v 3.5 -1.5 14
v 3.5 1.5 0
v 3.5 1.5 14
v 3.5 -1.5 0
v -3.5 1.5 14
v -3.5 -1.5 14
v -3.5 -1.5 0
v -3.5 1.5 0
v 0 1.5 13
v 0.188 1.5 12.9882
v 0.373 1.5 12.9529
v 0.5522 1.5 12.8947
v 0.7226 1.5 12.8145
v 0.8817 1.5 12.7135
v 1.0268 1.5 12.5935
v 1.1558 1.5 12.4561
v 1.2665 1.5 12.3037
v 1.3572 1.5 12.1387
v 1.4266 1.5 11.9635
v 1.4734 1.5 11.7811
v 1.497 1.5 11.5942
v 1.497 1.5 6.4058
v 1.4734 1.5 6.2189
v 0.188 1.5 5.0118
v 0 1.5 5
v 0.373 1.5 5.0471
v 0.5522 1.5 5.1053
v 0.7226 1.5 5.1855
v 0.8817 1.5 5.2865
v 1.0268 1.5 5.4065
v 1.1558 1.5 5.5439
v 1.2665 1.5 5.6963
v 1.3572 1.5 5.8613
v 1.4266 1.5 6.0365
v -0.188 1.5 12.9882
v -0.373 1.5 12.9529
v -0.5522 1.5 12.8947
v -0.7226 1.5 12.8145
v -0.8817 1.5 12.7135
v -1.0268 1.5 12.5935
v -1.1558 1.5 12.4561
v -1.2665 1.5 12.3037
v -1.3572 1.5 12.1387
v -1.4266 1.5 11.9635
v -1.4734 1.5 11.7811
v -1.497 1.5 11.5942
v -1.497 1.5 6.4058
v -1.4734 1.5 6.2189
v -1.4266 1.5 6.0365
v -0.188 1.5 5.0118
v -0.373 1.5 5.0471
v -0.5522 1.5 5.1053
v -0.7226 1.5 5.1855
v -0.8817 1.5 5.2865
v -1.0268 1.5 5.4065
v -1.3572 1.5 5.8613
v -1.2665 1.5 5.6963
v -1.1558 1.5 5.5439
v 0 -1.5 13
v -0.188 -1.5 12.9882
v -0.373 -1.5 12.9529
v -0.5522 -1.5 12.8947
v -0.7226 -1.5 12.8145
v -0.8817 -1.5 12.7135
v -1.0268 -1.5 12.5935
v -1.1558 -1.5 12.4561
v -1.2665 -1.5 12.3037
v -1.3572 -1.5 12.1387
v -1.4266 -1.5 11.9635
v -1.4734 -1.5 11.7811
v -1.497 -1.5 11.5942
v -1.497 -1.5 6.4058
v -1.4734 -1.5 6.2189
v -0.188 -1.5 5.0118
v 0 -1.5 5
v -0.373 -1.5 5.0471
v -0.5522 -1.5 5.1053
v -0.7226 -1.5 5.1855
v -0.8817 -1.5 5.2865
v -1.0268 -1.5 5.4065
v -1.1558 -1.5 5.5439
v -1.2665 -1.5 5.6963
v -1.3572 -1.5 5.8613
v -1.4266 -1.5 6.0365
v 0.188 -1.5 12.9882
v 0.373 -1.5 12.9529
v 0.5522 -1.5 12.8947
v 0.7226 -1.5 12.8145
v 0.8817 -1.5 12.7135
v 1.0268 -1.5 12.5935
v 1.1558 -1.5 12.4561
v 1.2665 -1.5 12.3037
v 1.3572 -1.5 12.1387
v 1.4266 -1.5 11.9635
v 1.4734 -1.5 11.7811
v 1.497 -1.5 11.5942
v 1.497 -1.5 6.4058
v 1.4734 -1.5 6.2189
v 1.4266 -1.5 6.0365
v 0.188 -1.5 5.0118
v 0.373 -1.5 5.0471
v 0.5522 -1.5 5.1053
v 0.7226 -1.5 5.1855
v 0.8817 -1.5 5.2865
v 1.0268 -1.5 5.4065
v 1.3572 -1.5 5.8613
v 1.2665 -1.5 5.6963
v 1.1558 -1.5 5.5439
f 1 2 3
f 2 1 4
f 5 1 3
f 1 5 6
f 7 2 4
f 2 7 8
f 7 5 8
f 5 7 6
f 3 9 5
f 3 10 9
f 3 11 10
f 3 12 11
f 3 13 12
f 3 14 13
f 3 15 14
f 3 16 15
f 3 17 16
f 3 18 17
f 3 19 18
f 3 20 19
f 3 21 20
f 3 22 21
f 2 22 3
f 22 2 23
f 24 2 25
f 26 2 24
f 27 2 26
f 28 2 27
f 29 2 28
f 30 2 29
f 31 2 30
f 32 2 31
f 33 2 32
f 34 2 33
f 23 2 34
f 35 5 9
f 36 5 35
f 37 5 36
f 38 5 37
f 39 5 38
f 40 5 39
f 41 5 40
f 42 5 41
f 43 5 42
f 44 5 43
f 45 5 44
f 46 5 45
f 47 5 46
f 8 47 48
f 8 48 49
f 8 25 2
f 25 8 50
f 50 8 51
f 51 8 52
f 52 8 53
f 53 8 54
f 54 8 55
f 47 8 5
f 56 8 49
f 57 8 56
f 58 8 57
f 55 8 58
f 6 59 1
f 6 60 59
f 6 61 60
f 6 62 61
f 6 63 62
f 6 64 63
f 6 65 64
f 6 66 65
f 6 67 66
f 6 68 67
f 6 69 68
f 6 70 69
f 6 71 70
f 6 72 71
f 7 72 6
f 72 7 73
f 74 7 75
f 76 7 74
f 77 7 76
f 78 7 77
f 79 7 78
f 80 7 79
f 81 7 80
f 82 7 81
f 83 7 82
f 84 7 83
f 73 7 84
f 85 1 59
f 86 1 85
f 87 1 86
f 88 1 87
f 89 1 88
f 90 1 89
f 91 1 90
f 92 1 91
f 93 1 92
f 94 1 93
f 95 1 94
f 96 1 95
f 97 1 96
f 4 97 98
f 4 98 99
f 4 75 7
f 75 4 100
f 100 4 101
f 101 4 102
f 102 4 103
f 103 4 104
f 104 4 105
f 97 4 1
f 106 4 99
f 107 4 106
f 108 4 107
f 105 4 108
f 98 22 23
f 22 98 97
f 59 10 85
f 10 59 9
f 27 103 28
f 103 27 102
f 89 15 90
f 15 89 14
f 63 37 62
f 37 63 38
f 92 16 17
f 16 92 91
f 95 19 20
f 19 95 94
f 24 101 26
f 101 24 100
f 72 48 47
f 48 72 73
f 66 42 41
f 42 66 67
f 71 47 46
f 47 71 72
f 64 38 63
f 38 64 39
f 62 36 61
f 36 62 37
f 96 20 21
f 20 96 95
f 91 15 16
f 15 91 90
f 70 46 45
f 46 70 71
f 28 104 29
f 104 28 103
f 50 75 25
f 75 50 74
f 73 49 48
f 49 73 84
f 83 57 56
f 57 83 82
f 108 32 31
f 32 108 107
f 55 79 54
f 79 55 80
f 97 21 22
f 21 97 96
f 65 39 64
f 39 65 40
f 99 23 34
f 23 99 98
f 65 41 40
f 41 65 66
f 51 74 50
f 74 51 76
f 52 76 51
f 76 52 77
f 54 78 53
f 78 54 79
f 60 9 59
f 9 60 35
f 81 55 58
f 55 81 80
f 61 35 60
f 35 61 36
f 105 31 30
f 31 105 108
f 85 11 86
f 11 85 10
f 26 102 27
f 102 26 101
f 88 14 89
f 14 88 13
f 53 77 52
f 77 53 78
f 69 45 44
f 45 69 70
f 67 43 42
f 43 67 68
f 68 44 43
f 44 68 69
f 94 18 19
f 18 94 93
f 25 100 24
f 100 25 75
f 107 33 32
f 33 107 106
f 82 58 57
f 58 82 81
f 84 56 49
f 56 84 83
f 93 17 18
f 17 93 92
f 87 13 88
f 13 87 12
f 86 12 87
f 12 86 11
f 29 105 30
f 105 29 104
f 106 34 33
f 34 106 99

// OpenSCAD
$fn = 50;

difference() {
	union() {
		translate(v = [-3.5, -1.5, 0]) {
			cube(size = [7, 3, 14]);
		}
	}
	union() {
		translate(v = [0, -1.5, 9.0]) {
			rotate(a = [0, 90, 90]) {
				hull() {
					difference() {
						union() {
							translate(v = [-2.5, 0, 0]) {
								cylinder(h = 3, r = 1.5);
							}
							translate(v = [2.5, 0, 0]) {
								cylinder(h = 3, r = 1.5);
							}
						}
						union();
					}
				}
			}
		}
	}
}
